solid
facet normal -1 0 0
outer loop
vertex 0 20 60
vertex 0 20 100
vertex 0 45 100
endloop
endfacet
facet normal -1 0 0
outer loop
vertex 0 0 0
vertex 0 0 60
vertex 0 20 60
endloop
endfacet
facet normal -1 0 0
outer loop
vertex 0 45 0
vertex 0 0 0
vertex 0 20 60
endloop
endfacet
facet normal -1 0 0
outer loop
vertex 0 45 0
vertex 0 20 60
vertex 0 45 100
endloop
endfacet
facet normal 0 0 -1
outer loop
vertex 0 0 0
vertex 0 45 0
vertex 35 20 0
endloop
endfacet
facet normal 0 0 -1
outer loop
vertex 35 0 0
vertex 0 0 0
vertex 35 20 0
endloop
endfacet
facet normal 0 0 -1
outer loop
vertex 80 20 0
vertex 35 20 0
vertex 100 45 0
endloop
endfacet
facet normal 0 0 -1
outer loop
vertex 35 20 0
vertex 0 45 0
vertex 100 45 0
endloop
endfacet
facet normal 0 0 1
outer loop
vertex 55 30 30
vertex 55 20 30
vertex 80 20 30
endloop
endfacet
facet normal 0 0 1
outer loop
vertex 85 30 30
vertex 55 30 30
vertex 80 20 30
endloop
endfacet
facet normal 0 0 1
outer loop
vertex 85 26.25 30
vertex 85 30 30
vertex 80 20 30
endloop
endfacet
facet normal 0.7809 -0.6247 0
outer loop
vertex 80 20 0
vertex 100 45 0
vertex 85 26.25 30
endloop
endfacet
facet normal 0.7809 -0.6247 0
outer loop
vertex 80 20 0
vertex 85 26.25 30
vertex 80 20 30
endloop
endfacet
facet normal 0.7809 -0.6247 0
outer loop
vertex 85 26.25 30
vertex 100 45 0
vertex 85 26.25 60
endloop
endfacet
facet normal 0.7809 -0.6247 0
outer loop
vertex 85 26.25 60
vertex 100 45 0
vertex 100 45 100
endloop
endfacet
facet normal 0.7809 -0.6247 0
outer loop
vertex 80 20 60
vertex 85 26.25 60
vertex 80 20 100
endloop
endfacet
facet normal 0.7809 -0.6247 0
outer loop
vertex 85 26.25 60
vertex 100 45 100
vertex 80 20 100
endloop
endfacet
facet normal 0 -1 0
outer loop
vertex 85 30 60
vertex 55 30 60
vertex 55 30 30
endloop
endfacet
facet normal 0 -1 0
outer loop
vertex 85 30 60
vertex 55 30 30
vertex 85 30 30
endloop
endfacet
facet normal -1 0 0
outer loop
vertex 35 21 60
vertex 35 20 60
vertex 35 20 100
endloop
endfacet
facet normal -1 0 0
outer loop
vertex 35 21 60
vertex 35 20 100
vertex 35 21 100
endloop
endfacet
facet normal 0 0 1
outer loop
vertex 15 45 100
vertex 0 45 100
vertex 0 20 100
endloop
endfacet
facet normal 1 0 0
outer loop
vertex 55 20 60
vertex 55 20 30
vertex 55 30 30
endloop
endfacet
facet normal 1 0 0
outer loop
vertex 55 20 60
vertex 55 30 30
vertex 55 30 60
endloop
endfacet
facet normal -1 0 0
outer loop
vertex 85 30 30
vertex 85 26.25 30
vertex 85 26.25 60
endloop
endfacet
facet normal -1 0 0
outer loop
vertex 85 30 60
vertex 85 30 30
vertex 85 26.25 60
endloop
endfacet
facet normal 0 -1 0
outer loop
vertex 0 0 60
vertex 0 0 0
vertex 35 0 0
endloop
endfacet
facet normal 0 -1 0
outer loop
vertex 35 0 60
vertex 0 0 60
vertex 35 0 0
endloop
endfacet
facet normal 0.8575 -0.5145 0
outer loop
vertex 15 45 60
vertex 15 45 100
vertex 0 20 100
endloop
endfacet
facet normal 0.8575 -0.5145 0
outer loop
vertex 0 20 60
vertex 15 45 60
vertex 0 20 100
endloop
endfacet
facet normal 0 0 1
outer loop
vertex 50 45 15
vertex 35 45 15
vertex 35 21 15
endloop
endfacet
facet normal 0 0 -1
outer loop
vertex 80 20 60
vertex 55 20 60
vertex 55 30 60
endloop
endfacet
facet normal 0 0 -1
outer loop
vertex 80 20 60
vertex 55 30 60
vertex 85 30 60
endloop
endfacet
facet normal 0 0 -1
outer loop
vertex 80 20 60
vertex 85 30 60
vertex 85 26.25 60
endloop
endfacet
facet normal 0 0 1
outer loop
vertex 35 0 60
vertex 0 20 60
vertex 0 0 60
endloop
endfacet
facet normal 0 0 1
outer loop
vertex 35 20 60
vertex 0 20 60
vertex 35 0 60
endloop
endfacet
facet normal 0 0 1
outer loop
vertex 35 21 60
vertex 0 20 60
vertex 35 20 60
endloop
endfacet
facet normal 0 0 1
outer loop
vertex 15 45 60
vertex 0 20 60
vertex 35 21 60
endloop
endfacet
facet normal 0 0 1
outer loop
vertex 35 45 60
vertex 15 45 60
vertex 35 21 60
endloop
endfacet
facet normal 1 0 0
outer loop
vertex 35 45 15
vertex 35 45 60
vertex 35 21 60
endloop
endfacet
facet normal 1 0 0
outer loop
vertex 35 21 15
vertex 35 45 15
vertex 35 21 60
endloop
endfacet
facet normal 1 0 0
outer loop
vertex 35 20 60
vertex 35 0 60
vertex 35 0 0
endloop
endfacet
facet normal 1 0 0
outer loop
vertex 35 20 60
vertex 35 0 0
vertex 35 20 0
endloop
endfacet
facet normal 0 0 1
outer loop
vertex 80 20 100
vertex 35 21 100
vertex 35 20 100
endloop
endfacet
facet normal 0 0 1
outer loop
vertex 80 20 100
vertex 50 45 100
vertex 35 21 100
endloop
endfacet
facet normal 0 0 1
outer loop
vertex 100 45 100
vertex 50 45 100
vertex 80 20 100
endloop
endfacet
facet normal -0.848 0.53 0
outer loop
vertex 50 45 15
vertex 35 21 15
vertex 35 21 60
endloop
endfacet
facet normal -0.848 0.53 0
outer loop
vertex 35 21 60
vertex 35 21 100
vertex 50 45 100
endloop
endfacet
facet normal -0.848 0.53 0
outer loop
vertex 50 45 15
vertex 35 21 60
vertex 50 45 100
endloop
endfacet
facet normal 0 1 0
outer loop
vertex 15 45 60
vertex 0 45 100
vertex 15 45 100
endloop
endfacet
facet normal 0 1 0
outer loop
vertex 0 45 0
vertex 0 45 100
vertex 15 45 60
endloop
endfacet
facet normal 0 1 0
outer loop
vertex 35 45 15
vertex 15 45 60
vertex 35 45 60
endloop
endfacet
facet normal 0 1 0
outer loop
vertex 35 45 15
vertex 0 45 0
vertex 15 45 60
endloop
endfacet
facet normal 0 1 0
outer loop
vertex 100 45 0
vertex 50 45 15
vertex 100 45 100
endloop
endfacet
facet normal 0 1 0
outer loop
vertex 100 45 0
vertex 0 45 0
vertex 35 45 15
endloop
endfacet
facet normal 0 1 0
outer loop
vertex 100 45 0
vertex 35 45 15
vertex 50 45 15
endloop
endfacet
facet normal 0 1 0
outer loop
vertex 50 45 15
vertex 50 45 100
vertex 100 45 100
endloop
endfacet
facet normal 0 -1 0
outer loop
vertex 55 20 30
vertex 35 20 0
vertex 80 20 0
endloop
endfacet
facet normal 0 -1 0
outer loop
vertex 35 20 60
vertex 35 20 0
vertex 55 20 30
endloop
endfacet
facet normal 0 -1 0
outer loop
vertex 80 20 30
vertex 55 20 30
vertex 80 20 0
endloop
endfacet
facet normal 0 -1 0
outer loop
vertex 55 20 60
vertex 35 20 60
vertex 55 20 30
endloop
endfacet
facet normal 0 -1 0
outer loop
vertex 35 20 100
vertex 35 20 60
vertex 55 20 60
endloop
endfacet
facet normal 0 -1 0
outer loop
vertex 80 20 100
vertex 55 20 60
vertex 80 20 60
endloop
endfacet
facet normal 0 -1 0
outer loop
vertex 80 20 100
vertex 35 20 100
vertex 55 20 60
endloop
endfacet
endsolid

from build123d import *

# Parameters (mm, degrees)
F0_W      = 100
F0_H      = 45
F1_DEPTH  = 100
F3_DEPTH  = 40
F4_W      = 45
F4_H      = 20
F5_DEPTH  = 100.001
F7_DEPTH  = 100.001
F9_DEPTH  = 85
F10_W     = 30
F10_H     = 30
F11_DEPTH = 10


with BuildPart() as f1:
    # F0 (on Top) → F1 (new body)
    with BuildSketch(Plane.XY):
        with Locations((50, 22.5)):
            Rectangle(F0_W, F0_H)
    extrude(amount=F1_DEPTH)

    # F2 (on face) → F3 (cut)
    with BuildSketch(Plane.XY.offset(100)):
        Polygon((35, 45), (15, 45), (0, 20), (0, 0), (35, 0), align=None)
    extrude(amount=-F3_DEPTH, mode=Mode.SUBTRACT)

    # F4 (on face) → F5 (cut, through all)
    with BuildSketch(Plane.XY.offset(100)):
        with Locations((57.5, 10)):
            Rectangle(F4_W, F4_H)
    extrude(amount=-F5_DEPTH, mode=Mode.SUBTRACT)

    # F6 (on face) → F7 (cut, through all)
    with BuildSketch(Plane.XY.offset(100)):
        Polygon((100, 45), (80, 20), (80, 0), (100, 0), align=None)
    extrude(amount=-F7_DEPTH, mode=Mode.SUBTRACT)

    # F8 (on face) → F9 (cut)
    with BuildSketch(Plane.XY.offset(100)):
        Polygon((50, 45), (35, 45), (35, 21), align=None)
    extrude(amount=-F9_DEPTH, mode=Mode.SUBTRACT)

    # F10 (on face) → F11 (cut)
    with BuildSketch(Plane.XZ.offset(-20)):
        with Locations((70, 45)):
            Rectangle(F10_W, F10_H)
    extrude(amount=-F11_DEPTH, mode=Mode.SUBTRACT)


solid = f1.part
